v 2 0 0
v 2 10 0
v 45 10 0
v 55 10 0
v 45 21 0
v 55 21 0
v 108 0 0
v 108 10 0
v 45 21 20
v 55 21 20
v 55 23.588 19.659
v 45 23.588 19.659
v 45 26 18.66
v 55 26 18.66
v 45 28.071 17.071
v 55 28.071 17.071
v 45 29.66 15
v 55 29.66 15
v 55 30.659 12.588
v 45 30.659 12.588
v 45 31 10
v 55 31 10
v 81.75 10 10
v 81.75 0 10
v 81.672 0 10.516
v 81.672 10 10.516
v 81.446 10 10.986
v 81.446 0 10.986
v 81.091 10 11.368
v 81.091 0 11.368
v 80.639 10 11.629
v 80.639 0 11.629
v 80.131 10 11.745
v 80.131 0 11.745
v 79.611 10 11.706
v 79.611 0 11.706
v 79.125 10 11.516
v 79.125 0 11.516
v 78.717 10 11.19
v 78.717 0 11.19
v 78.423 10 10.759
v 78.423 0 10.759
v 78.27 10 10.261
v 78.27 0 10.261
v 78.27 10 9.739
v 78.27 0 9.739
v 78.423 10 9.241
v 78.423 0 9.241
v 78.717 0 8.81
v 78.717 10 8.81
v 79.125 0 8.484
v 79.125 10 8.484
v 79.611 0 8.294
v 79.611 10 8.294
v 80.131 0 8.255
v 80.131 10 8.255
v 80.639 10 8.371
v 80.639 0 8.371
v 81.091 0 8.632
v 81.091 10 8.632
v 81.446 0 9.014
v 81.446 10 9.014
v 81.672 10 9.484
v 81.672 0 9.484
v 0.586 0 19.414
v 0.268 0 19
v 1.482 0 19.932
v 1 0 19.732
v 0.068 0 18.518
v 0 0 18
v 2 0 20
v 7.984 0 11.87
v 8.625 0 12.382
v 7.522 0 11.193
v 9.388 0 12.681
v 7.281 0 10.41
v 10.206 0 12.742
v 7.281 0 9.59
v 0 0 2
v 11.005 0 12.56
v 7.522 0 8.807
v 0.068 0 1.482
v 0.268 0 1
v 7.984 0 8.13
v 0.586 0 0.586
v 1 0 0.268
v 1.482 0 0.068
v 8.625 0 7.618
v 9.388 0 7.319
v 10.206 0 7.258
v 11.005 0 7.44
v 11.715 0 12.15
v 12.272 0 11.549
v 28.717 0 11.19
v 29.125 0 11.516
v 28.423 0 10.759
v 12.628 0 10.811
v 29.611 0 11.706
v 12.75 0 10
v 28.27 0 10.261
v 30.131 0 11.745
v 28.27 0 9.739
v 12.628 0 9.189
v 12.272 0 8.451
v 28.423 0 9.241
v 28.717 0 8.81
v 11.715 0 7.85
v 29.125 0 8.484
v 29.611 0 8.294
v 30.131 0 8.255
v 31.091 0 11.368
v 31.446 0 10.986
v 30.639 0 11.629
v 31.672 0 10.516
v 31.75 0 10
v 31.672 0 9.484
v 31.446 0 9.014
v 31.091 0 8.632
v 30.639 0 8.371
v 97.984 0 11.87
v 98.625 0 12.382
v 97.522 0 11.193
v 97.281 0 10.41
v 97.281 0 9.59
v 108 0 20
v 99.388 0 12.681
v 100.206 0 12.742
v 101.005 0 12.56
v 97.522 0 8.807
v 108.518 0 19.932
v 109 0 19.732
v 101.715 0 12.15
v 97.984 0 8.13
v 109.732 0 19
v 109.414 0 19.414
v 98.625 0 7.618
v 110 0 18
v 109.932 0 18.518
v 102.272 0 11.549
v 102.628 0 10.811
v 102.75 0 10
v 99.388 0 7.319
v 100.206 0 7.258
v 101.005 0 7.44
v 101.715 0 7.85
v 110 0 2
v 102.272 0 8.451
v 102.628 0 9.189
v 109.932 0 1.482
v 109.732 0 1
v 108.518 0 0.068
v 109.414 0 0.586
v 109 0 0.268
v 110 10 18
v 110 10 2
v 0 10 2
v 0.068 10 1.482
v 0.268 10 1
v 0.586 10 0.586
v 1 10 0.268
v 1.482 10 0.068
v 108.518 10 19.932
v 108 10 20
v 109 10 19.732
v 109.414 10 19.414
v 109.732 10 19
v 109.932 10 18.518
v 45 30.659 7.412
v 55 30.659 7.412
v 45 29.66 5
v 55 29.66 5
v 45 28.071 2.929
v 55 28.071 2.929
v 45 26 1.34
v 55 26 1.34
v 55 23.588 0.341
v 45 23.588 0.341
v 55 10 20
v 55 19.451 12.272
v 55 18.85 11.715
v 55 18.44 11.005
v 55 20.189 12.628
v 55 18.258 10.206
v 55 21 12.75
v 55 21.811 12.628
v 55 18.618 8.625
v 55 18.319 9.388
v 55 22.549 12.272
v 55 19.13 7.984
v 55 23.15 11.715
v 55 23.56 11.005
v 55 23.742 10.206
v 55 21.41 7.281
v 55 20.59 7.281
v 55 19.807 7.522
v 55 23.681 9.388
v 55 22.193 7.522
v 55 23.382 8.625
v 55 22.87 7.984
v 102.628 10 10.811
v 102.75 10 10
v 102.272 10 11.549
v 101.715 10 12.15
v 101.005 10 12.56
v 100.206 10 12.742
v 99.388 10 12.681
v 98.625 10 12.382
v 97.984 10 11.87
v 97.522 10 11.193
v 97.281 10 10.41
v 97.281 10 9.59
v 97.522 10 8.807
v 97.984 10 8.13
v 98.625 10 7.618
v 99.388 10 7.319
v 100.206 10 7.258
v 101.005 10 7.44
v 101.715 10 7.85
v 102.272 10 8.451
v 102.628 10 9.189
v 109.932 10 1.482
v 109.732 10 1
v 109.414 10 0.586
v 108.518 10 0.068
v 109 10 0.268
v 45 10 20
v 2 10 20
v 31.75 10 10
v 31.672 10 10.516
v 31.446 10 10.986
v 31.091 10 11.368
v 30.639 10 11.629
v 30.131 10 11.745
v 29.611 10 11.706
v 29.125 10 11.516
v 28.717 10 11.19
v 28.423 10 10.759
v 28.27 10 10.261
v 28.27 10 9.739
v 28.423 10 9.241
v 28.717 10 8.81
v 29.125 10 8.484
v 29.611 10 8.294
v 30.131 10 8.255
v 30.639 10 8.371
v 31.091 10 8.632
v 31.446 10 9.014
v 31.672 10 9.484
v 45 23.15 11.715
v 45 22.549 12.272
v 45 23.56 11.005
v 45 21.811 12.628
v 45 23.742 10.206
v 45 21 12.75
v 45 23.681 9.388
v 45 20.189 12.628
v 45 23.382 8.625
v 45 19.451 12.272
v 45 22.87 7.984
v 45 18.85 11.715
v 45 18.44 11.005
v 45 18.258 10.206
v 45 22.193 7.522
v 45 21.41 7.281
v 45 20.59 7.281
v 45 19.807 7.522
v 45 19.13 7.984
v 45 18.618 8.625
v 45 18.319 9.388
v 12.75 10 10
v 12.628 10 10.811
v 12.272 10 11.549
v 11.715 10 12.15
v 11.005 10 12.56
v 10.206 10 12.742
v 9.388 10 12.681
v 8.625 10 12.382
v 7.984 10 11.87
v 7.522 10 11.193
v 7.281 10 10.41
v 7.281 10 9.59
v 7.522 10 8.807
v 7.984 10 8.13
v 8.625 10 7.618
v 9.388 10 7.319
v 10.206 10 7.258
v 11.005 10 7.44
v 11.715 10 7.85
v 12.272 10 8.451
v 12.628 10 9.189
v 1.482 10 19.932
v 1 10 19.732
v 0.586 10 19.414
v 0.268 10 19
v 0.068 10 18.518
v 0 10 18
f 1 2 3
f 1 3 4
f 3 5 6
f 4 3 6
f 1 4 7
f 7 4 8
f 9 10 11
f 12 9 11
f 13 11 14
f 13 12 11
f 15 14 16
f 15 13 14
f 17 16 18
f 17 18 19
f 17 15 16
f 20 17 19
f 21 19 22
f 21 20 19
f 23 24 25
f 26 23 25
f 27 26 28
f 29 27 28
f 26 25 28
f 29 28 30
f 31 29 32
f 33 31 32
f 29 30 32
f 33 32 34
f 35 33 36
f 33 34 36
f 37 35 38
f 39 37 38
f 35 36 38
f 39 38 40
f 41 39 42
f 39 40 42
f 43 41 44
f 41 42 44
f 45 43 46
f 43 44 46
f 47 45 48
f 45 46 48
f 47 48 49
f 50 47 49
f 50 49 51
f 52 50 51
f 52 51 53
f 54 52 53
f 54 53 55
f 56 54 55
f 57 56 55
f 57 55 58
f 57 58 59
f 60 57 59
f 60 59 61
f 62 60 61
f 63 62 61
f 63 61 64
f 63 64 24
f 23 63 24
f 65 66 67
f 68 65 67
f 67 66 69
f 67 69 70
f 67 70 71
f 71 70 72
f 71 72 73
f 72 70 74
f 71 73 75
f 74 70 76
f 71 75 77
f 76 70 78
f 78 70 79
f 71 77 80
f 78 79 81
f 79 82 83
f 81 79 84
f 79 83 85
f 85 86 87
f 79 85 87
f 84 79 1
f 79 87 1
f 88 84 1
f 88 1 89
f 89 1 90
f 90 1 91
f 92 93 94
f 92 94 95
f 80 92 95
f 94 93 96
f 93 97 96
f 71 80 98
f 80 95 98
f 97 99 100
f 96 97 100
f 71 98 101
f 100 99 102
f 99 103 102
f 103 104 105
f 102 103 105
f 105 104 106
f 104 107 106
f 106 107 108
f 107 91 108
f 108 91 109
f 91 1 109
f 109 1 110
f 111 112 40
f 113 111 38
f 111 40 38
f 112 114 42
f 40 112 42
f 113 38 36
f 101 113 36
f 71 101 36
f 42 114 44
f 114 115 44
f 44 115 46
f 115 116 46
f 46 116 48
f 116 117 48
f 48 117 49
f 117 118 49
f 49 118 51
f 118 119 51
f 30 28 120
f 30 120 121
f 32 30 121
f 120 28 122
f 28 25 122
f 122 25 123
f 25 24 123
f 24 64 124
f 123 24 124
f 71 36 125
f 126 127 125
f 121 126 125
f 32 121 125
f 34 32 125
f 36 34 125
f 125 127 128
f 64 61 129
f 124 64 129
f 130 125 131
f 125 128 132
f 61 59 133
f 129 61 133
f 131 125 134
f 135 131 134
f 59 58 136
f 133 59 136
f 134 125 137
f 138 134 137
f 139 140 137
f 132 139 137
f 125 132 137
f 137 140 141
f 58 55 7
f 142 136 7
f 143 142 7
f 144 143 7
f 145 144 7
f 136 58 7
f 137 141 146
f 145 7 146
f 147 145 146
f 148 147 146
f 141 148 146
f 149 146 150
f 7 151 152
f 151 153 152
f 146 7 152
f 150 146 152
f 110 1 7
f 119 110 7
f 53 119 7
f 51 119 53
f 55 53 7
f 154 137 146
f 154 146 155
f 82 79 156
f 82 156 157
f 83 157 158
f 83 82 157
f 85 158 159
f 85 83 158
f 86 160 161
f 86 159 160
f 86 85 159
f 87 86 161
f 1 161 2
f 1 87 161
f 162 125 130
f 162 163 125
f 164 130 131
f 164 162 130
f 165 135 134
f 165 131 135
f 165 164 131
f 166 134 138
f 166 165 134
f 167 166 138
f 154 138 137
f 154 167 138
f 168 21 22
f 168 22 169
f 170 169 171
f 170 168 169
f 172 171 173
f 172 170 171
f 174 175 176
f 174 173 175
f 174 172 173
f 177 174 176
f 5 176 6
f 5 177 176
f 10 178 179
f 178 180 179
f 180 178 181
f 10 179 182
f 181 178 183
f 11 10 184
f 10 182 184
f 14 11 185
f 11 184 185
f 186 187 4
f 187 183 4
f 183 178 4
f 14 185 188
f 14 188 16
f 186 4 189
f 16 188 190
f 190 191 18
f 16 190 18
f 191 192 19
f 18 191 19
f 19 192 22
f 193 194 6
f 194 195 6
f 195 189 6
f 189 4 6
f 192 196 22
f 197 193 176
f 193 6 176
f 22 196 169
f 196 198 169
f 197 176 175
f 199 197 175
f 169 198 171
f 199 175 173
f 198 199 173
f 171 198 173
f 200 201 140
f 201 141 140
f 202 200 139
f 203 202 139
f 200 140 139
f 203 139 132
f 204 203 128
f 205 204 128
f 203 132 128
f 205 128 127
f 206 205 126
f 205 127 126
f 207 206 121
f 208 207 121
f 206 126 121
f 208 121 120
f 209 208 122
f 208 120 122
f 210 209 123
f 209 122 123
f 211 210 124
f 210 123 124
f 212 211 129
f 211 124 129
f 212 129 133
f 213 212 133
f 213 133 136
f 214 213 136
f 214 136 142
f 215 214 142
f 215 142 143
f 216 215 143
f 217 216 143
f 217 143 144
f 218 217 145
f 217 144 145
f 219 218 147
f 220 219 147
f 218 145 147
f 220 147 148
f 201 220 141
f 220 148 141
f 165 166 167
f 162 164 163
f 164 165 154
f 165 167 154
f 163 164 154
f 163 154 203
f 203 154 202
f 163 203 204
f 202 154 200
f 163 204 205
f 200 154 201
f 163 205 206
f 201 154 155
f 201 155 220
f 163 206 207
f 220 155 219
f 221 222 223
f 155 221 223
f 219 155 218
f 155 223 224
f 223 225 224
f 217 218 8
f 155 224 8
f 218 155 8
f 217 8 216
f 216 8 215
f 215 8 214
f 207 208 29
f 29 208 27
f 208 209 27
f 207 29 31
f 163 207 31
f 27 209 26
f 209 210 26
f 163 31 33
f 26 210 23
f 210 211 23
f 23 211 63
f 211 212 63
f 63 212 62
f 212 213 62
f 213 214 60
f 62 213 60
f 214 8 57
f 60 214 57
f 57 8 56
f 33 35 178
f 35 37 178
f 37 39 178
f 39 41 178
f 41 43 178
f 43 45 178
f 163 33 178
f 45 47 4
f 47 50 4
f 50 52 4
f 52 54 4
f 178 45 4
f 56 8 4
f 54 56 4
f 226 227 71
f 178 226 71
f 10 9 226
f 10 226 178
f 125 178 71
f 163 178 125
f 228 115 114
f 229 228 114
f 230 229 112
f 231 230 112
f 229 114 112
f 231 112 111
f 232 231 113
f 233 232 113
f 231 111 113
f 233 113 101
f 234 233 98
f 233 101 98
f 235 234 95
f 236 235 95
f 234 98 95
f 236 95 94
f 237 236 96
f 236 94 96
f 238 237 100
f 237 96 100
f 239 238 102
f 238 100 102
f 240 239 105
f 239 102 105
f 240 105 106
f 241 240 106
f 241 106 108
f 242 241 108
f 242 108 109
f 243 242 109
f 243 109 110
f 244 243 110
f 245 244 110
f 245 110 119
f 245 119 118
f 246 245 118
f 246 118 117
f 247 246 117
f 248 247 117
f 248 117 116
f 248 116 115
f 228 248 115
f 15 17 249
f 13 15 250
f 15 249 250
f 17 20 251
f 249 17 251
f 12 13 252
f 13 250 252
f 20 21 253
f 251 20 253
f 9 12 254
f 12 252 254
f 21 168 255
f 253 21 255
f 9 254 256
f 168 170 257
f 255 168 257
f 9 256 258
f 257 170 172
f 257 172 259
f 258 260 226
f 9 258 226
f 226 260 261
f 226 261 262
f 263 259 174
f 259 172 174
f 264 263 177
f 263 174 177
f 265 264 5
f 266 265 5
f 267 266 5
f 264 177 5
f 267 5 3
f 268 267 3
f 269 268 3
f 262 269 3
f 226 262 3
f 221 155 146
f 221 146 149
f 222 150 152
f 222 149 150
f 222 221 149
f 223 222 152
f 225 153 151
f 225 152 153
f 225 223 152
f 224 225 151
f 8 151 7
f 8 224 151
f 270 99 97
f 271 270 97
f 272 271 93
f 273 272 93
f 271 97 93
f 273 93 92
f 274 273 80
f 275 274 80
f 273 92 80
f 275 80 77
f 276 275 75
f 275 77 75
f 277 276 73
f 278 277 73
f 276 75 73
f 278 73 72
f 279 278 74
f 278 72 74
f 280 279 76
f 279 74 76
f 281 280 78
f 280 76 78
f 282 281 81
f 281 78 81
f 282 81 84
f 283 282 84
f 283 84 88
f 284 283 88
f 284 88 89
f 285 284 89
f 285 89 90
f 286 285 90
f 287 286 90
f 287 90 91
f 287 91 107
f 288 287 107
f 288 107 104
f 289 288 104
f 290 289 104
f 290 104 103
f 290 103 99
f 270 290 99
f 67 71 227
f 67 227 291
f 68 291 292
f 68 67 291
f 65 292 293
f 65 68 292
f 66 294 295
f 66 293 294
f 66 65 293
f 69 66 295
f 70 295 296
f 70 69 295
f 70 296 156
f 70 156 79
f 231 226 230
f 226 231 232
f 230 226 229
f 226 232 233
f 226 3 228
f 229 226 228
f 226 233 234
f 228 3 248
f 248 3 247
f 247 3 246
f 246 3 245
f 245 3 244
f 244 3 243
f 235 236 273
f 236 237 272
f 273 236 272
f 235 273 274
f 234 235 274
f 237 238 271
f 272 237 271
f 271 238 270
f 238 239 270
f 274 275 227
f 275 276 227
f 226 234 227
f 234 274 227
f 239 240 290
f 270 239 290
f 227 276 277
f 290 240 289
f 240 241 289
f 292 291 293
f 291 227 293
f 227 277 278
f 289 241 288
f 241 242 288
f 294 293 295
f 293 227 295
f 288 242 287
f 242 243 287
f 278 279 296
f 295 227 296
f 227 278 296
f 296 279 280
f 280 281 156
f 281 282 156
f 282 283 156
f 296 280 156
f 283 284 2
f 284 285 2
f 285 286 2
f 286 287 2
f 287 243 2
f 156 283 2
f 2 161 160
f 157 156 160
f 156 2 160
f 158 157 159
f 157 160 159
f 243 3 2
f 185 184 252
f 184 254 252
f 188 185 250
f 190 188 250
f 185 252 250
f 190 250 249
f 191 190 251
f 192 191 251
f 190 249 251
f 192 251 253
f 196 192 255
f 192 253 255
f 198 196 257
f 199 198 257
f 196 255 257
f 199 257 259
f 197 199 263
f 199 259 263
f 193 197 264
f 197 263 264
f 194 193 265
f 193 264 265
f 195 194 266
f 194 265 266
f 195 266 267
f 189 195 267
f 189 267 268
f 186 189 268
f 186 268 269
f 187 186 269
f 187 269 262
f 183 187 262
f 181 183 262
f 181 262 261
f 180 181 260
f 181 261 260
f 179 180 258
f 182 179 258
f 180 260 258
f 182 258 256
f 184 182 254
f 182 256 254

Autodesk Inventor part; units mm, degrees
ref_plane "YZ Plane" through (0, 0, 0) normal (1, 0, 0) x (0, 1, 0)
ref_plane "XZ Plane" through (0, 0, 0) normal (0, 1, 0) x (-1, 0, 0)
ref_plane "XY Plane" through (0, 0, 0) normal (0, 0, 1) x (1, 0, 0)
sketch "スケッチ1" plane through (0, 0, 0) normal (0, 0, 1) x (1, 0, 0)
  line L0 (0, 0) -> (110, 0)
  line L1 (110, 0) -> (110, 10)
  line L2 (110, 10) -> (55, 10)
  line L3 (55, 10) -> (55, 31)
  line L4 (55, 31) -> (45, 31)
  line L5 (45, 31) -> (45, 10)
  line L6 (45, 10) -> (0, 10)
  line L7 (0, 10) -> (0, 0)
  dimension "d0" = 110
  dimension "d1" = 10
  dimension "d2" = 21
  dimension "d3" = 10
  dimension "d4" = 45
extrude "押し出し1" add sketch "スケッチ1" along normal blind 20
sketch "スケッチ2" plane through (0, 0, 0) normal (0, -1, 0) x (1, 0, 0)
  line L0 (110, 0) -> (110, 20) construction
  line L1 (110, 10) -> (0, 10) construction
  line L2 (0, 0) -> (0, 20) construction
  circle A0 centre (100, 10) radius 2.75
  circle A1 centre (10, 10) radius 2.75
  line L3 (0, 0) -> (110, 0) construction
  line L4 (55, 0) -> (55, 20) construction
  line L5 (0, 20) -> (110, 20) construction
  circle A2 centre (80, 10) radius 1.75
  circle A3 centre (30, 10) radius 1.75
  dimension "d7" = 5.5
  dimension "d8" = 10
  dimension "d9" = 10
  dimension "d17" = 3.5
  dimension "d18" = 50
extrude "押し出し2" cut sketch "スケッチ2" against normal through all
sketch "スケッチ3" plane through (45, 10, 0) normal (-1, 0, 0) x (0, 0, 1)
  line L0 (0, 21) -> (20, 21) construction
  line L1 (10, 21) -> (10, 0) construction
  line L2 (0, 0) -> (20, 0) construction
  circle A0 centre (10, 11) radius 2.75
  point P0 (0, -10)
  dimension "d12" = 10
  dimension "d13" = 5.5
extrude "押し出し3" cut sketch "スケッチ3" against normal through all
fillet "フィレット1" radius 10 2 edges at (50, 31, 0) (50, 31, 20)
fillet "フィレット2" radius 2 4 edges at (110, 5, 20) (110, 5, 0) (0, 5, 0) (0, 5, 20)
properties part number "_3D プリント"
